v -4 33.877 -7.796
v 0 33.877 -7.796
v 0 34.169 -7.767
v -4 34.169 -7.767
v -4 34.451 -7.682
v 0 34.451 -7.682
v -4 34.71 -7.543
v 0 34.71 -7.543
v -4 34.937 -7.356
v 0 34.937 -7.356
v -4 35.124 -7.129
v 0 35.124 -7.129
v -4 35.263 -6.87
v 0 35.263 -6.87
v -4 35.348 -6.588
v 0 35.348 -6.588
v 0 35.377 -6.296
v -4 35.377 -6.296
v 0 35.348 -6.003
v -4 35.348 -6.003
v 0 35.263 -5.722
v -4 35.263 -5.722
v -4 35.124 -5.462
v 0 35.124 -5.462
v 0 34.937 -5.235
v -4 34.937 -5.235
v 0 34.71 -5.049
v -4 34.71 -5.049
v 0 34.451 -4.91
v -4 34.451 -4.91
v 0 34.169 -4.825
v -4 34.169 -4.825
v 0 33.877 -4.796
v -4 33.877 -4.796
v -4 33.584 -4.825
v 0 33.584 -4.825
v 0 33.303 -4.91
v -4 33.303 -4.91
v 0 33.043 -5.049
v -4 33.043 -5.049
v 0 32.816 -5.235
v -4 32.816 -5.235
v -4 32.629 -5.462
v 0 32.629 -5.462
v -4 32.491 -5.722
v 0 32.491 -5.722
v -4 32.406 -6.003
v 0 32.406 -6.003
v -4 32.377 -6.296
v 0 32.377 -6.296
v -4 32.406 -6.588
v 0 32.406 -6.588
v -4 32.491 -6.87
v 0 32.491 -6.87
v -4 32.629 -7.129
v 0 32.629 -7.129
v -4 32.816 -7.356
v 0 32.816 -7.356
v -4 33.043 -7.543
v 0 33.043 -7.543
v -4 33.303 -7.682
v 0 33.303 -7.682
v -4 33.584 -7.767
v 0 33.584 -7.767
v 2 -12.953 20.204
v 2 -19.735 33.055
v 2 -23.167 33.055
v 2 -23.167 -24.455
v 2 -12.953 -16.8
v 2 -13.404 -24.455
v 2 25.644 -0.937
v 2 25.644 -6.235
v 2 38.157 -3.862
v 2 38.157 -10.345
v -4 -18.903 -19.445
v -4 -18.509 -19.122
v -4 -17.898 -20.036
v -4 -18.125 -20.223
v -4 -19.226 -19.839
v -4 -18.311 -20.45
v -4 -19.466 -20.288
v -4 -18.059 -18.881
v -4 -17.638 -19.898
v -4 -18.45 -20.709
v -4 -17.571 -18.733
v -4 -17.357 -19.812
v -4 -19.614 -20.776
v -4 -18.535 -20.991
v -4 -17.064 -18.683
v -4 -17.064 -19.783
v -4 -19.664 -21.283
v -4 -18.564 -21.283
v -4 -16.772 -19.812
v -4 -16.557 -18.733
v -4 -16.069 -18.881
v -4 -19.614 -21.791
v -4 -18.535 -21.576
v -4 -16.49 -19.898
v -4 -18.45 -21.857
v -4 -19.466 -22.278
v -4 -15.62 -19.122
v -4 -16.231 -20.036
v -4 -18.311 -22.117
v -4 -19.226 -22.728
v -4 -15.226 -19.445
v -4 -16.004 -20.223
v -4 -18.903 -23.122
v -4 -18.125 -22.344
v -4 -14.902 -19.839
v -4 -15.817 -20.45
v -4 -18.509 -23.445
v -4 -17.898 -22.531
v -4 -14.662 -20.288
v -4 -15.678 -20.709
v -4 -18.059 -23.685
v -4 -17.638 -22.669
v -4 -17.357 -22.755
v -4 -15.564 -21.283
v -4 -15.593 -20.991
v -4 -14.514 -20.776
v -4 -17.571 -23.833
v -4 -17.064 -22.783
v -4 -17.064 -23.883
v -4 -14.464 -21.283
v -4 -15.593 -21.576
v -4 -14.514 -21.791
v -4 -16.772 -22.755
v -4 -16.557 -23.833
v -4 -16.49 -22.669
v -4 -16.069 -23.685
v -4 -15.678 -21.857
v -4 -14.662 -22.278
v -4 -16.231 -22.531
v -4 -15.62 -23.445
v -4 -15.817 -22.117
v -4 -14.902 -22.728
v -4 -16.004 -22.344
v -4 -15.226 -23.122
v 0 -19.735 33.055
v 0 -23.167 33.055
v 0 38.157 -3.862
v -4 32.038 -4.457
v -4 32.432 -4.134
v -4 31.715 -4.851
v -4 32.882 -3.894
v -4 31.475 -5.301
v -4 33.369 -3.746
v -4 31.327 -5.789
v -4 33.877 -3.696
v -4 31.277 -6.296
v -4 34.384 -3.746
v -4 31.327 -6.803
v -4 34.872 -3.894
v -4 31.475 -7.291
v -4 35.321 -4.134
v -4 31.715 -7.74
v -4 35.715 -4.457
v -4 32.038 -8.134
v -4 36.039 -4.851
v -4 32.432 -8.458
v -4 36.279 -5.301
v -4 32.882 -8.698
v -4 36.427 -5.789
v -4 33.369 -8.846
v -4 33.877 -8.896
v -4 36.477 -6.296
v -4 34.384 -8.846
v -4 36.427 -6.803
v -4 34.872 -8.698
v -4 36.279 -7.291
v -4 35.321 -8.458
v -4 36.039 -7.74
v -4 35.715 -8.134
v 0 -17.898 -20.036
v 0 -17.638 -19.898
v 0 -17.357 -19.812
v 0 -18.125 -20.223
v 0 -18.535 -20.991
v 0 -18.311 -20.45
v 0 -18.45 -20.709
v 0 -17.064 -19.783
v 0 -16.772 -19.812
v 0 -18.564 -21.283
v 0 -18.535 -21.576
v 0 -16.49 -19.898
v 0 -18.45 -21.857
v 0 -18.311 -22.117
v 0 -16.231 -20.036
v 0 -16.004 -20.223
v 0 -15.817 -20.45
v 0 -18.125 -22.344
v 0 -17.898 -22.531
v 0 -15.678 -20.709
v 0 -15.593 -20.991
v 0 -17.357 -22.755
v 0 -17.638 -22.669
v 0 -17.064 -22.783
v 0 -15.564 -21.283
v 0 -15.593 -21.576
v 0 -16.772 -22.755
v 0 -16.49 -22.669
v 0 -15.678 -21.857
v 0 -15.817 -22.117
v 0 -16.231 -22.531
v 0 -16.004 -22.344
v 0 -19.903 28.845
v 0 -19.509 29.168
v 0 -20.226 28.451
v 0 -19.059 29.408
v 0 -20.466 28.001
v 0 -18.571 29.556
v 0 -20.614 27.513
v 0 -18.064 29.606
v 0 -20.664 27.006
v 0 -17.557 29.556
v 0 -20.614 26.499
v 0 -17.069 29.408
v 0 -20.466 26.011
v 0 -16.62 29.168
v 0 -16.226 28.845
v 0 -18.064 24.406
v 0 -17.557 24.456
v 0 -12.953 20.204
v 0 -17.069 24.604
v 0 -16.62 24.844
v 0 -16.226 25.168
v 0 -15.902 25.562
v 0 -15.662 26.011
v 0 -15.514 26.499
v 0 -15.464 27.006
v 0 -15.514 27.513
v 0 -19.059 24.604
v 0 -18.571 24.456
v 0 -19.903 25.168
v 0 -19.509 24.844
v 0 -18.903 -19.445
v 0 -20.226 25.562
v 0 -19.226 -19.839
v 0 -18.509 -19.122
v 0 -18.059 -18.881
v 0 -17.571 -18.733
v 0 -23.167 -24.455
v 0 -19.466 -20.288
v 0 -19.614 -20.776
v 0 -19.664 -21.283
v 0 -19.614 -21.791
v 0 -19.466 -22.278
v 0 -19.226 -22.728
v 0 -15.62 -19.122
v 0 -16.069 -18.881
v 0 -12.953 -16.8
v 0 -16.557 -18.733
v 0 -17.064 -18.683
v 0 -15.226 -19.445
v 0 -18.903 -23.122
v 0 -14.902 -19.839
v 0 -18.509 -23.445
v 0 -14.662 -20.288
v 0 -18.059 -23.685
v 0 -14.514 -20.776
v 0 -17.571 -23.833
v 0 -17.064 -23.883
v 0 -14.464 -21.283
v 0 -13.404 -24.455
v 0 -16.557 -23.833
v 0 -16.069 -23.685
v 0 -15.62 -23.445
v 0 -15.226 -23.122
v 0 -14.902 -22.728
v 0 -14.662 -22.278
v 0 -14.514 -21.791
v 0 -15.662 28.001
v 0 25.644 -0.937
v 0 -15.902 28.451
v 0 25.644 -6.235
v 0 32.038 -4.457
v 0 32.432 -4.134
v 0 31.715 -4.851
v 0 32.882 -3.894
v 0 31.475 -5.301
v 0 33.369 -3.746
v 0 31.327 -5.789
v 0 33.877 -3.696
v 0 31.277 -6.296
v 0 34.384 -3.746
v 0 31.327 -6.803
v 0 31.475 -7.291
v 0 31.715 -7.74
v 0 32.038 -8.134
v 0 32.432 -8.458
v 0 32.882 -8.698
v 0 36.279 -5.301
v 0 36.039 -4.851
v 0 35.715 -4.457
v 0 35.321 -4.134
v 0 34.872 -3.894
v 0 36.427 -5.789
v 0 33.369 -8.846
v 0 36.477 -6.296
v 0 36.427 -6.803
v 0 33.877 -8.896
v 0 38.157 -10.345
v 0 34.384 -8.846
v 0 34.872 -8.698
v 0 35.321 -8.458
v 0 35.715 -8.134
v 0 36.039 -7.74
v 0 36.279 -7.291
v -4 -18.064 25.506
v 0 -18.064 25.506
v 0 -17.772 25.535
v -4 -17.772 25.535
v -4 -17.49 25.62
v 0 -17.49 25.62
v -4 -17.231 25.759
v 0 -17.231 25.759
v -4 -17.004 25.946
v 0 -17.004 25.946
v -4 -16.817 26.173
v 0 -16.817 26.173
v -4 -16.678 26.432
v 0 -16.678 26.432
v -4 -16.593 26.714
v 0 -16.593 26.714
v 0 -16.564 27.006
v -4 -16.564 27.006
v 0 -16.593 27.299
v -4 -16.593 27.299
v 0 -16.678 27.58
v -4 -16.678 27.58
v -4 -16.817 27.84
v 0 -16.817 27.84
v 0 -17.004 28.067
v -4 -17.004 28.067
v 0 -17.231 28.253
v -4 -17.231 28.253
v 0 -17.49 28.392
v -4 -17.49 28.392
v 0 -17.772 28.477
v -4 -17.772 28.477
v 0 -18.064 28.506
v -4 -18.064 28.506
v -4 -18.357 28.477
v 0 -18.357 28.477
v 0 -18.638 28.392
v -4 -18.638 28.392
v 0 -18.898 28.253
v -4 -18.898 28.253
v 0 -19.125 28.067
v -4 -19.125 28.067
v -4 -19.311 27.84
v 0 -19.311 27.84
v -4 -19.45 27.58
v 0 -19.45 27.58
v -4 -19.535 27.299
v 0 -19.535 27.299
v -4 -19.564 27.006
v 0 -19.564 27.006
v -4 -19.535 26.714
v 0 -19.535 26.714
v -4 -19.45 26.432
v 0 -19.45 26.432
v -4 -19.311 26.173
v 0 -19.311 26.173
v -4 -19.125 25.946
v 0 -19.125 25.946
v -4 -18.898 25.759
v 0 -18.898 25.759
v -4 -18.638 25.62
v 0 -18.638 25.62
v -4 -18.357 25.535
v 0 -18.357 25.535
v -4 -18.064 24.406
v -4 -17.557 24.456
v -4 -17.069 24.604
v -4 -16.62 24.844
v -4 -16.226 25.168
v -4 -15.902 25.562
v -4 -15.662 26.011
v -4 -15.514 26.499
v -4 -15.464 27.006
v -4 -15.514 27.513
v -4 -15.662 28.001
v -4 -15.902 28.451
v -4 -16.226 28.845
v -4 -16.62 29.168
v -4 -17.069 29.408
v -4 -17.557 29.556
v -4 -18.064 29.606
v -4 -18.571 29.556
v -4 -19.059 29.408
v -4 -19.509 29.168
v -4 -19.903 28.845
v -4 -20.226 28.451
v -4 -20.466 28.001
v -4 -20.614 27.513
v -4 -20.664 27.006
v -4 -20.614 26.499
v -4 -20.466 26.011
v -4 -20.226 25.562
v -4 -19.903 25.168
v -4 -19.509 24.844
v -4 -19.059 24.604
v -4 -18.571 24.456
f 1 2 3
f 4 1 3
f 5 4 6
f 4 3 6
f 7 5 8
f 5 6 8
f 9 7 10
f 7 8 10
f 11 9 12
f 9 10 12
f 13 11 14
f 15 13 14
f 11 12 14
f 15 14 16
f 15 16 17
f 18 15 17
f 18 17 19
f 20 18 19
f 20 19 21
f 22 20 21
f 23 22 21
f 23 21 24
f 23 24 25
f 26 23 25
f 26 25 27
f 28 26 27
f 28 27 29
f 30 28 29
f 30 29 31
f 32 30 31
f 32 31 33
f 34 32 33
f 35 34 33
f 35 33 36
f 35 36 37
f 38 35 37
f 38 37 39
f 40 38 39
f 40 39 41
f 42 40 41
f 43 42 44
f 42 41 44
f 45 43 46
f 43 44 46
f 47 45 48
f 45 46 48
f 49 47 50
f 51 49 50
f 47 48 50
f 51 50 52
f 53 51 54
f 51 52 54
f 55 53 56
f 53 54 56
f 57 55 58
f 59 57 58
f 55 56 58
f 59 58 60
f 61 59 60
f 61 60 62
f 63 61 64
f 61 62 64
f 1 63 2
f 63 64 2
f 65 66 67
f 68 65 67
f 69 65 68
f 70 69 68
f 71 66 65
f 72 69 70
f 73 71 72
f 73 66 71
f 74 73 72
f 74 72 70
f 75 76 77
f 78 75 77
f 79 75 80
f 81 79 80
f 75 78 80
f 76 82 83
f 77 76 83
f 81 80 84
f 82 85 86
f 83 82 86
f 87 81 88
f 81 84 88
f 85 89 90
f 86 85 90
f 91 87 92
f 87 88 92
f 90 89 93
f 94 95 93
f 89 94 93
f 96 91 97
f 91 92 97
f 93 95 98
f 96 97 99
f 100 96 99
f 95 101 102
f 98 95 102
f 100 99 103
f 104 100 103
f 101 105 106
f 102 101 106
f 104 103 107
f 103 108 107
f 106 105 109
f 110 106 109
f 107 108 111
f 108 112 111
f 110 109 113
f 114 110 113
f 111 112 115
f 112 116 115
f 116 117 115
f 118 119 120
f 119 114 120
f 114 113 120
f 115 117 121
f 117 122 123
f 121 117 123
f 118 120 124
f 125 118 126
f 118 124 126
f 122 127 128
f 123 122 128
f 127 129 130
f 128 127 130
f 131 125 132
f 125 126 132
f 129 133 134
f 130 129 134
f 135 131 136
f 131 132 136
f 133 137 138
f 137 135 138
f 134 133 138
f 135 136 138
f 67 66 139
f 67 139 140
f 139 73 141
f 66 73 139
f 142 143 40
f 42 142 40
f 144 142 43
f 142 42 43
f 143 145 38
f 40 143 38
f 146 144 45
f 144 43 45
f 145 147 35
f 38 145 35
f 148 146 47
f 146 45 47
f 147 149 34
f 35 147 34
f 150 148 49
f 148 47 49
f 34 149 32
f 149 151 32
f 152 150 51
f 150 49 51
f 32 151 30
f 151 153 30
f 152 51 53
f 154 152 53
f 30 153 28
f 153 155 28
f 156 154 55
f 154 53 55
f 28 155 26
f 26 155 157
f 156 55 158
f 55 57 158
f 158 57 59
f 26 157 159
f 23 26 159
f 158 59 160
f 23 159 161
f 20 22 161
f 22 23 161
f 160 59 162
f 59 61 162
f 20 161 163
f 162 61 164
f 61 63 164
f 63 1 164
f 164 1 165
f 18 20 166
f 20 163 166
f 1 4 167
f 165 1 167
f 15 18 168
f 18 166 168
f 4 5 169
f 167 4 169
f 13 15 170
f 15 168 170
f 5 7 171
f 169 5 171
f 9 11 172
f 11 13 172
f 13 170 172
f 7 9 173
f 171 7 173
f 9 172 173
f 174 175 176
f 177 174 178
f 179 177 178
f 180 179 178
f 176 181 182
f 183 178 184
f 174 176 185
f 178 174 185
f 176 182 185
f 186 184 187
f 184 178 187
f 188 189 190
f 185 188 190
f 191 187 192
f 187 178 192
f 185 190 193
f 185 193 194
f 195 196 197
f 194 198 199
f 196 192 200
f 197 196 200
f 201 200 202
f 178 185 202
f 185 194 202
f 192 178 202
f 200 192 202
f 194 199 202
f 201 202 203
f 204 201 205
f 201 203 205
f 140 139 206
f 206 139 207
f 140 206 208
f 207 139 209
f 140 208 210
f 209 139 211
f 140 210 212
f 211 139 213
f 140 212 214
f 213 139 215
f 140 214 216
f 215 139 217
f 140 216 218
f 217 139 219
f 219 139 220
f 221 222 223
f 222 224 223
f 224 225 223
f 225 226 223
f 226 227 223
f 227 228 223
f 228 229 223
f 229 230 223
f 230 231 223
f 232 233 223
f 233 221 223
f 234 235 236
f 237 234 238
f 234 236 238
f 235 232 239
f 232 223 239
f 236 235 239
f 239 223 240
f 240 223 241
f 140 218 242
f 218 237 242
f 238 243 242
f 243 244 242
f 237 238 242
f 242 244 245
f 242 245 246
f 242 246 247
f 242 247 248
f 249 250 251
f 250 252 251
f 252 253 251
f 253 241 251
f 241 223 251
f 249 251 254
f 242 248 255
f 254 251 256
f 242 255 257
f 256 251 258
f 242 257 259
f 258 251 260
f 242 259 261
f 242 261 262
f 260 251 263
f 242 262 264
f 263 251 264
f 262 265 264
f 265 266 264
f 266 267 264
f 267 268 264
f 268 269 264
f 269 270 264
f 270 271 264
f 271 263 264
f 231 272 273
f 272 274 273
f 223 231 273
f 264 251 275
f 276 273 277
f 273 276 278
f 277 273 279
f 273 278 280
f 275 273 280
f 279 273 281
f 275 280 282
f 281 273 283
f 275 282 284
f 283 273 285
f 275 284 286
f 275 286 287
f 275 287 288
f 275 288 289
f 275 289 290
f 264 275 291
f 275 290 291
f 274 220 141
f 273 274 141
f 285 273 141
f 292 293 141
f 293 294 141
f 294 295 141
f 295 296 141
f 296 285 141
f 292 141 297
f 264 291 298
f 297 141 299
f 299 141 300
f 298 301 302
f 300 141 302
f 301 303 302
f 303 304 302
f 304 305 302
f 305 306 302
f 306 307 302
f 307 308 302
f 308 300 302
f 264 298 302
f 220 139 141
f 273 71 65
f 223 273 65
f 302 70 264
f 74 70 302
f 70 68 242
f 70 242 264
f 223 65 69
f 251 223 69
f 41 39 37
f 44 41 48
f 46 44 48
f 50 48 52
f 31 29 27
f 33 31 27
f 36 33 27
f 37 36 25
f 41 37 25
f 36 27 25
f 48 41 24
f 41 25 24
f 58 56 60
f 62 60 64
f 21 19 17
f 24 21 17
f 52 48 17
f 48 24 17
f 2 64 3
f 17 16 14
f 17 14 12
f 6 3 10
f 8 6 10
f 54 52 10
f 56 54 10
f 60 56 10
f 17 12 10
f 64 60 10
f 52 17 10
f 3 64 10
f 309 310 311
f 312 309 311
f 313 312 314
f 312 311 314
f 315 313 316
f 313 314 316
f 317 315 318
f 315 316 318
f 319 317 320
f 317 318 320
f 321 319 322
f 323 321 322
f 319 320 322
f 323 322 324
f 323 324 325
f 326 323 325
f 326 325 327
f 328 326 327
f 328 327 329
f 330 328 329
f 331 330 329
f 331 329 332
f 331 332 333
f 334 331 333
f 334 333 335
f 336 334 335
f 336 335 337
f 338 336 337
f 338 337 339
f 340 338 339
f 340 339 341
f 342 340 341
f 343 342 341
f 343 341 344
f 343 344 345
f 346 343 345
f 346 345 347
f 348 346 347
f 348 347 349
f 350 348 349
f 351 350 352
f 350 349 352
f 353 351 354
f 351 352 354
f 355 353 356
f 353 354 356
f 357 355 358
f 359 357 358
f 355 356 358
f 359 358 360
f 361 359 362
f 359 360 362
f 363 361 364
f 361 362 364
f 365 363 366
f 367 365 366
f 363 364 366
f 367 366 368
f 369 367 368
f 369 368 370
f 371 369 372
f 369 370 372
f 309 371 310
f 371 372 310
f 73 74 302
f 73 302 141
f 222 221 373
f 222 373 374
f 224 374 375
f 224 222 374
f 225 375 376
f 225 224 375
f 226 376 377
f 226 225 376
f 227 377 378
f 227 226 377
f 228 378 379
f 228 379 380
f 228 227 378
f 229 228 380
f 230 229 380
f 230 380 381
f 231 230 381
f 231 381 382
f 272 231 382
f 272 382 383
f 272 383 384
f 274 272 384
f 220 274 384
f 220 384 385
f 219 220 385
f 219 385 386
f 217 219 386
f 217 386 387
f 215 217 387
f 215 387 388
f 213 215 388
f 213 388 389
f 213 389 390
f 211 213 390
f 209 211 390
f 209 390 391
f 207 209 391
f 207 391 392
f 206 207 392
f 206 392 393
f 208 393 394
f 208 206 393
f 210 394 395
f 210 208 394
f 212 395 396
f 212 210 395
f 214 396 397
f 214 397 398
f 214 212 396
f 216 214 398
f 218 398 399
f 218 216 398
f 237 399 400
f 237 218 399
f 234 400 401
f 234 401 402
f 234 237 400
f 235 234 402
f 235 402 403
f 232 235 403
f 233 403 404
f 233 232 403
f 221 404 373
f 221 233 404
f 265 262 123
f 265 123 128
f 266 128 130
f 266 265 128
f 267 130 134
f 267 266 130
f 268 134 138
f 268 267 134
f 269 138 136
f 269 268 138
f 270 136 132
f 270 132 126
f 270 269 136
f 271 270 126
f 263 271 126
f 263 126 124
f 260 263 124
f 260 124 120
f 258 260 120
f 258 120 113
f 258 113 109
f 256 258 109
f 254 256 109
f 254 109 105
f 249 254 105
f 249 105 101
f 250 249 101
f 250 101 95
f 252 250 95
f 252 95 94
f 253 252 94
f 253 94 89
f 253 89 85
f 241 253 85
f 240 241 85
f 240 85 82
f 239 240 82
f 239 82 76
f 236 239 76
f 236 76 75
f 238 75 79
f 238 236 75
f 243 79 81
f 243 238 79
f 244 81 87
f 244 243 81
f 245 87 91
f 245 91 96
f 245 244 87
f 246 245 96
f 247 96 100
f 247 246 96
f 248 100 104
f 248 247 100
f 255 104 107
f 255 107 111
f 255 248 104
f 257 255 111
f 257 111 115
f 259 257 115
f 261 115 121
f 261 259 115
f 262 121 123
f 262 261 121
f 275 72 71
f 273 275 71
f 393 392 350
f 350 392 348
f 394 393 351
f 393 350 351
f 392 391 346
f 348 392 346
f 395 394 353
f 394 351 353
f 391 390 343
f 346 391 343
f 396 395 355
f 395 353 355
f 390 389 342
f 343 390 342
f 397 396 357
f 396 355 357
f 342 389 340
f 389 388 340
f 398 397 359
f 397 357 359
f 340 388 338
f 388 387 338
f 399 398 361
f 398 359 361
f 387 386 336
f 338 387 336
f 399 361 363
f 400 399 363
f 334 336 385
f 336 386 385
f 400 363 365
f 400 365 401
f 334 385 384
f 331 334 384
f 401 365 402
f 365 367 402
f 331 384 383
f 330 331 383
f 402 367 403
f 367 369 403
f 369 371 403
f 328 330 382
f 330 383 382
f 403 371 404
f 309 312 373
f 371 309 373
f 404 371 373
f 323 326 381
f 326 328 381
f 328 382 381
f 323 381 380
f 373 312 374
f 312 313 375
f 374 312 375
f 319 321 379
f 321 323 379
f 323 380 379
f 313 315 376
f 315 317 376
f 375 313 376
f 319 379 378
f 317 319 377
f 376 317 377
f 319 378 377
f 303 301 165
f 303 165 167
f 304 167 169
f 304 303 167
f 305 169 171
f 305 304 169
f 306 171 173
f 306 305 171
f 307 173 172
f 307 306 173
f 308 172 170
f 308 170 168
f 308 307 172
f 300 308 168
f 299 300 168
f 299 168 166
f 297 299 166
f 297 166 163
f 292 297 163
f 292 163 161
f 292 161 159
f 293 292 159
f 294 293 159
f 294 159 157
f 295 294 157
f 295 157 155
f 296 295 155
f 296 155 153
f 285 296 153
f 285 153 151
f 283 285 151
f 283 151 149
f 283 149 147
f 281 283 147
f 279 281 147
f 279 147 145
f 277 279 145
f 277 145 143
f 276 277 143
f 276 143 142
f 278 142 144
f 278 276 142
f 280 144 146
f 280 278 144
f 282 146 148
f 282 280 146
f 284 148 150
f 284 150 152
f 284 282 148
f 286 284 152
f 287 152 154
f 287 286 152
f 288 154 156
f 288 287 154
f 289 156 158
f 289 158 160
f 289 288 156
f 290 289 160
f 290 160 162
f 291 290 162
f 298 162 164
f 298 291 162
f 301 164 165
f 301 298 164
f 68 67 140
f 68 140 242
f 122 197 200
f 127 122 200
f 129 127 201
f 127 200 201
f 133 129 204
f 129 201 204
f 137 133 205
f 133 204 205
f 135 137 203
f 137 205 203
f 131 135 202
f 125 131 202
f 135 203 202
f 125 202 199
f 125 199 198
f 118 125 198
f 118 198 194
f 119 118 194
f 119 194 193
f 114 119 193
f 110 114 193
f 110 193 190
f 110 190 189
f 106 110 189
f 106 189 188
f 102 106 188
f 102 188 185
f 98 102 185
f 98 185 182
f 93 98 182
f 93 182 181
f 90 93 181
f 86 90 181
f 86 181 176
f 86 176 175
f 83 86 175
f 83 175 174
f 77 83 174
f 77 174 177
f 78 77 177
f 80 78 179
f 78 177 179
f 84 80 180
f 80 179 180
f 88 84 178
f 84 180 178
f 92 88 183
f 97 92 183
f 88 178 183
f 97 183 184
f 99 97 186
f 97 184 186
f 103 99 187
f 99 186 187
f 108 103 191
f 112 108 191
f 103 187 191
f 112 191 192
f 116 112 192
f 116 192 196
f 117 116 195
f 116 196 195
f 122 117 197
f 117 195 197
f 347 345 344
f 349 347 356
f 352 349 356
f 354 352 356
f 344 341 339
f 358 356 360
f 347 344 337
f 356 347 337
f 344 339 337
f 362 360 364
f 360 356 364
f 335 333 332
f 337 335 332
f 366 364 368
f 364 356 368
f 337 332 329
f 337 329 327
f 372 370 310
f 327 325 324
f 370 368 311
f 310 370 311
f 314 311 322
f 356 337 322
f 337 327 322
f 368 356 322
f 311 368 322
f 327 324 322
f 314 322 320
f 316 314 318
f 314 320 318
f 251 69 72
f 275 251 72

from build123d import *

# Parameters (mm, degrees)
SKETCH_1_W          = 63.552014958
SKETCH_1_H          = 75.18168128
EXTRUDE_1_DEPTH     = 2
CUT_EXTRUDE_3_DEPTH = 2
CUT_EXTRUDE_4_DEPTH = 2
SKETCH_2_R          = 2.6
SKETCH_2_R_2        = 1.5
EXTRUDE_2_DEPTH     = 6


with BuildPart() as part:
    # 草图1 → 凸台-拉伸1 (new body)
    with BuildSketch(Plane(origin=(0, 0, 0), x_dir=(0, 0, -1), z_dir=(1, 0, 0))):
        with Locations((-6.130256719, 2.766182452)):
            Rectangle(SKETCH_1_W, SKETCH_1_H)
    extrude(amount=EXTRUDE_1_DEPTH)

    # 草图3 → 切除-拉伸3 (cut)
    with BuildSketch(Plane(origin=(2, 0, 0), x_dir=(0, 0, -1), z_dir=(1, 0, 0))):
        Polygon((-37.906264198, -19.734560887), (-37.906264198, 40.357023092), (25.64575076, 40.357023092), (25.64575076, -13.40384327), (25.64575076, -23.166877668), (25.64575076, -34.824658188), (-37.906264198, -34.824658188), (-37.906264198, -23.166877668), align=None)
        Polygon((3.861598797, 38.157182144), (-33.05487502, -19.734560887), (-33.05487502, -23.166877668), (24.455499481, -23.166877668), (24.455499481, -13.40384327), (10.344863827, 38.157182144), align=None, mode=Mode.SUBTRACT)
    extrude(amount=-CUT_EXTRUDE_3_DEPTH, mode=Mode.SUBTRACT)

    # 草图4 → 切除-拉伸4 (cut)
    with BuildSketch(Plane(origin=(2, 0, 0), x_dir=(0, 0, -1), z_dir=(1, 0, 0))):
        Polygon((0.937037541, 25.644128731), (-20.204452885, -12.953479978), (16.800310672, -12.953479978), (6.235289924, 25.644128731), align=None)
    extrude(amount=-CUT_EXTRUDE_4_DEPTH, mode=Mode.SUBTRACT)

    # 草图2 → 凸台-拉伸2 (add)
    with BuildSketch(Plane(origin=(2, 0, 0), x_dir=(0, 0, -1), z_dir=(1, 0, 0))):
        with Locations((6.295781653, 33.876700988)):
            Circle(SKETCH_2_R)
        with Locations((6.295781653, 33.876700988)):
            Circle(SKETCH_2_R_2, mode=Mode.SUBTRACT)
        with Locations((-27.006264198, -18.064263021)):
            Circle(SKETCH_2_R)
        with Locations((-27.006264198, -18.064263021)):
            Circle(SKETCH_2_R_2, mode=Mode.SUBTRACT)
        with Locations((21.283382726, -17.064263021)):
            Circle(SKETCH_2_R)
        with Locations((21.283382726, -17.064263021)):
            Circle(SKETCH_2_R_2, mode=Mode.SUBTRACT)
    extrude(amount=-EXTRUDE_2_DEPTH)


solid = part.part
